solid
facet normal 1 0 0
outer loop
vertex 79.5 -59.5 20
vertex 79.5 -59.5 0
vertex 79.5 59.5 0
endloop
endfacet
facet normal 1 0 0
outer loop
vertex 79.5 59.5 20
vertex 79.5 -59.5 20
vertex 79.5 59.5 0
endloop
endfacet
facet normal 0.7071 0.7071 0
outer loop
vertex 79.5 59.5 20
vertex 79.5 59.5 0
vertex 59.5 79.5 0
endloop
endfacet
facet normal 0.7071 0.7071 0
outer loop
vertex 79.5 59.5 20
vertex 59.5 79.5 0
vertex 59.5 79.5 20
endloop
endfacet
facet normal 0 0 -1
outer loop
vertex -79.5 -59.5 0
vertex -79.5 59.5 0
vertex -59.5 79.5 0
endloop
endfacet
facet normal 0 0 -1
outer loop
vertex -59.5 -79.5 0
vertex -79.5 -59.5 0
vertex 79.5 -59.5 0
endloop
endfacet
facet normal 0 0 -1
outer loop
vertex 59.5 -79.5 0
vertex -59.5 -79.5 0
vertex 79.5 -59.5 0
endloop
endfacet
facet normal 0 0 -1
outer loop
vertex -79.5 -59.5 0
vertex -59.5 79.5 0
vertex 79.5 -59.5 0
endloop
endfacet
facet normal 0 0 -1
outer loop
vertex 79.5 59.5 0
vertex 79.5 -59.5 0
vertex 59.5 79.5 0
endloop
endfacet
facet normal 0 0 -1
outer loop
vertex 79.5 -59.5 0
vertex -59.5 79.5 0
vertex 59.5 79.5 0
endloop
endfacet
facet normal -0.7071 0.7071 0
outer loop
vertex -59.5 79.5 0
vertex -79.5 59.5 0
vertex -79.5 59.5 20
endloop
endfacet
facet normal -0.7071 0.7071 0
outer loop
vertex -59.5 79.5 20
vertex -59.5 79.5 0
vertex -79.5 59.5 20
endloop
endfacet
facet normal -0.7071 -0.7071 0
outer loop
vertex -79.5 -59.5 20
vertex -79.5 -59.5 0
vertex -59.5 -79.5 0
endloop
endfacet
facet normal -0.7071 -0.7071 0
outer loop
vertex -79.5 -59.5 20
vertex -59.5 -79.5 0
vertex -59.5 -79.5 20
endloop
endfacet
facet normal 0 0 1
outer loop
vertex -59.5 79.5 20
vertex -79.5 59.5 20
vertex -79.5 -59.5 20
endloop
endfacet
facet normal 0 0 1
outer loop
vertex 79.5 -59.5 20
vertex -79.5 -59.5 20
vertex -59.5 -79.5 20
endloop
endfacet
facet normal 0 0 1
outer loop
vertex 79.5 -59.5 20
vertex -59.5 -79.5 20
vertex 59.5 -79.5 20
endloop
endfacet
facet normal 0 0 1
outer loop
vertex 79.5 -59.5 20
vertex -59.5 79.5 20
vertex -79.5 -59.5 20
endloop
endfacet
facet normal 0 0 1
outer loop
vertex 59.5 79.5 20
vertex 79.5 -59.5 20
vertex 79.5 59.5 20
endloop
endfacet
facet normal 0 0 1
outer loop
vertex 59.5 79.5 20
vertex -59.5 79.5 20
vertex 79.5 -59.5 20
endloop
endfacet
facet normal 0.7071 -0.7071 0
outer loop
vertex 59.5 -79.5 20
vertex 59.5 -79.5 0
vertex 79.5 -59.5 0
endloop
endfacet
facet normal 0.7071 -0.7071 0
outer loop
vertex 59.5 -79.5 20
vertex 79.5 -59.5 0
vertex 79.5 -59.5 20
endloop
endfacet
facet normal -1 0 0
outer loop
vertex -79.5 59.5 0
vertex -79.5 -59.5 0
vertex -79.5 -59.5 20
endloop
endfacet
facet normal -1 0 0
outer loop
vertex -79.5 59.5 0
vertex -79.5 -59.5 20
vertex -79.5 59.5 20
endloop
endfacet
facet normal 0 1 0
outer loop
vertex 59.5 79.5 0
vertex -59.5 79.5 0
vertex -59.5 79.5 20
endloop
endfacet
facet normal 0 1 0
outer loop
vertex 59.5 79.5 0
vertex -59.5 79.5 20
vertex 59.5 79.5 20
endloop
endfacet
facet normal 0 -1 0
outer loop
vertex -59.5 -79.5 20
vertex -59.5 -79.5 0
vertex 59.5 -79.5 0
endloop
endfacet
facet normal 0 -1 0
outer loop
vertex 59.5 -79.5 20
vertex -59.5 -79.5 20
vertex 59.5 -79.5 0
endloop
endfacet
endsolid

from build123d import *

# Parameters (mm, degrees)
SKETCH_1_W      = 159
SKETCH_1_H      = 159
EXTRUDE_1_DEPTH = 20
CHAMFER_1_SIZE  = 20


with BuildPart() as part:
    # 草图1 → 凸台-拉伸1 (new body)
    with BuildSketch(Plane.XY):
        Rectangle(SKETCH_1_W, SKETCH_1_H)
    extrude(amount=EXTRUDE_1_DEPTH)

    # 倒角1
    chamfer_1_edges = [part.edges().sort_by_distance(p)[0] for p in [
        (79.5, -79.5, 10),
        (-79.5, -79.5, 10),
        (-79.5, 79.5, 10),
        (79.5, 79.5, 10),
    ]]
    chamfer(chamfer_1_edges, length=CHAMFER_1_SIZE)


solid = part.part
